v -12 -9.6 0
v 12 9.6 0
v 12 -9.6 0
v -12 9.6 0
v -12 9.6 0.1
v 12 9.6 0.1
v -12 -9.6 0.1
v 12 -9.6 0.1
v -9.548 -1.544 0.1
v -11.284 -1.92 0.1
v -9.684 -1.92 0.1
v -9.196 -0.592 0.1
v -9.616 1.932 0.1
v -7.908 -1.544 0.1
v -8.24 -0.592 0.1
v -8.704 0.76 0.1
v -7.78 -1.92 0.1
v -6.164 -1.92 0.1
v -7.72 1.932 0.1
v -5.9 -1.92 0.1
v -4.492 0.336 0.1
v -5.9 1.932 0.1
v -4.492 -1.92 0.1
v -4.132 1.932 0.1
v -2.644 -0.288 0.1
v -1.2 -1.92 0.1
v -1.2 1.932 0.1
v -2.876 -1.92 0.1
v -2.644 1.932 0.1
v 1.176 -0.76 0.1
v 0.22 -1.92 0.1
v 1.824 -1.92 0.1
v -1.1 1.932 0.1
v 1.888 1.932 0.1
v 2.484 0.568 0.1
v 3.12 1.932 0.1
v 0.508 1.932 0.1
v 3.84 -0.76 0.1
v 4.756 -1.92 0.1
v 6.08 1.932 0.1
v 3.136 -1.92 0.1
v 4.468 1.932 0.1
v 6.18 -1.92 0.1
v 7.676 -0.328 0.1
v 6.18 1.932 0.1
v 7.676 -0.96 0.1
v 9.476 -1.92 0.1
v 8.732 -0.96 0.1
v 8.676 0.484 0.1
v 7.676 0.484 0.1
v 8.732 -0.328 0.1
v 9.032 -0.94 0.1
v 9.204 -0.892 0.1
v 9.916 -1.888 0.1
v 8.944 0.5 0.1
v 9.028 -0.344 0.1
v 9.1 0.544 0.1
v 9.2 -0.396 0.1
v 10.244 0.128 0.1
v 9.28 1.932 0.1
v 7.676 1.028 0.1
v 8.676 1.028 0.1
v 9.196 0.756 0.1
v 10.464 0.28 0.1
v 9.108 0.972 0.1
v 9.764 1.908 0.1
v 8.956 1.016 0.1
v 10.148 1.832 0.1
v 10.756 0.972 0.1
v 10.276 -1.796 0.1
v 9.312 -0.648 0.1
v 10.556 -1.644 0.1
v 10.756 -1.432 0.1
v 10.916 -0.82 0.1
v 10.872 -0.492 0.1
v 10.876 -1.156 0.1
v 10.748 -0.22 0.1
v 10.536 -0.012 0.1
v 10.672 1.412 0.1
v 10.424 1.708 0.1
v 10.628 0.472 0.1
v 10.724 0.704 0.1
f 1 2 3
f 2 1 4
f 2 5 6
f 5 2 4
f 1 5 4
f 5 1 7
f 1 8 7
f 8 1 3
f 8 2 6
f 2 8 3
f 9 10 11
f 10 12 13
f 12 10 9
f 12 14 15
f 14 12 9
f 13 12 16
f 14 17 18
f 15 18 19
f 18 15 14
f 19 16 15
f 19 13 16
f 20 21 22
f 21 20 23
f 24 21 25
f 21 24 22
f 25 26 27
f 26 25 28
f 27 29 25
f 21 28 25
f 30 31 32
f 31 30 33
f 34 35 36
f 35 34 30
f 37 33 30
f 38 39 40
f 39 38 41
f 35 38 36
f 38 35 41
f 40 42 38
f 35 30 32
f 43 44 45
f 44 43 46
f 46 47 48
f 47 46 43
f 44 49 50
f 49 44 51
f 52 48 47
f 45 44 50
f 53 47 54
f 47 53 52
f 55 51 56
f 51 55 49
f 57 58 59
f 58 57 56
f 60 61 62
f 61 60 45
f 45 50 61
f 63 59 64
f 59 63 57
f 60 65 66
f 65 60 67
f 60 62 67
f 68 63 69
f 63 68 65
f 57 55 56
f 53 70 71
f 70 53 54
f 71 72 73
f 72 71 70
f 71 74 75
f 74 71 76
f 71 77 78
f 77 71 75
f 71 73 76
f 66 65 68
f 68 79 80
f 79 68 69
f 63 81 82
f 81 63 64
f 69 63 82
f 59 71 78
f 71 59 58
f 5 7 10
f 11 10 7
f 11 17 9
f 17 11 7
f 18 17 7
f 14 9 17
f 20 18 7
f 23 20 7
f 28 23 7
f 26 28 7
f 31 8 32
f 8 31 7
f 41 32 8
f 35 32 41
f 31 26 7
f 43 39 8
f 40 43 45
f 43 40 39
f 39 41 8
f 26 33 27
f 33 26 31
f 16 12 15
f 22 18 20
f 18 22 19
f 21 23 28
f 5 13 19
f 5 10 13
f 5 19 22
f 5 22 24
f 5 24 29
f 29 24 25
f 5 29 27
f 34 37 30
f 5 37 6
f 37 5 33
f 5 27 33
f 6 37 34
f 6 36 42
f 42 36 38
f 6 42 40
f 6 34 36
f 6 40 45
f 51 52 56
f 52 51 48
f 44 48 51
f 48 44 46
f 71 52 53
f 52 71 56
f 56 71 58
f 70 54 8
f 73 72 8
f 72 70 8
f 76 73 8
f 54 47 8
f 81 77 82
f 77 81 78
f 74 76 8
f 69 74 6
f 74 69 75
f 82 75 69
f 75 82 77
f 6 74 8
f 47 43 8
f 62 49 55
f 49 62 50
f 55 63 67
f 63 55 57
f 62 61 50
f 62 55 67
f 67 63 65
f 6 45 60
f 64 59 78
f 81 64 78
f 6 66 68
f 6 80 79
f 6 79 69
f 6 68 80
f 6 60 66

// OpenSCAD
// file: ../p/box5-12.scad
use <../lib.scad>
function ldraw_lib__box5_12() = [
// 0 Box with 5 Faces without Any Edges
// 0 Name: box5-12.dat
// 0 Author: Chris Dee [cwdee]
// 0 !LDRAW_ORG Primitive UPDATE 2009-02
// 0 !LICENSE Licensed under CC BY 4.0 : see CAreadme.txt
// 
// 0 BFC CERTIFY CCW
  [0,"BFC","CERTIFY"],
  [0,"BFC","CCW"],
// 
// 0 !HISTORY 2009-09-03 [PTadmin] Official Update 2009-02
// 
// 
// 4 16 1 1 1 1 1 -1 -1 1 -1 -1 1 1
  [4,16,1,1,1,1,1,-1,-1,1,-1,-1,1,1],
// 4 16 -1 0 1 1 0 1 1 1 1 -1 1 1
  [4,16,-1,0,1,1,0,1,1,1,1,-1,1,1],
// 4 16 -1 0 -1 -1 0 1 -1 1 1 -1 1 -1
  [4,16,-1,0,-1,-1,0,1,-1,1,1,-1,1,-1],
// 4 16 1 0 -1 -1 0 -1 -1 1 -1 1 1 -1
  [4,16,1,0,-1,-1,0,-1,-1,1,-1,1,1,-1],
// 4 16 1 0 1 1 0 -1 1 1 -1 1 1 1
  [4,16,1,0,1,1,0,-1,1,1,-1,1,1,1],
// 0
];
module ldraw_lib__box5_12(step=0, col=false, unit=2/5, alt=false, line=0.2, solid=!$preview)
    makepoly(ldraw_lib__box5_12(), step=step, col=col, unit=unit, alt=alt, line=line, solid=solid);
ldraw_lib__box5_12(line=0.2);
// main file
use <../lib.scad>
use <../p/box5-12.scad>
function ldraw_lib__194535b() = [
// 0 Sticker  2.4 x  3 with Black "ANWB" on Yellow Background
// 0 Name: 194535b.dat
// 0 Author: Takeshi Takahashi [RainbowDolphin]
// 0 !LDRAW_ORG Part UPDATE 2022-06
// 0 !LICENSE Licensed under CC BY 4.0 : see CAreadme.txt
// 
// 0 BFC CERTIFY CCW
  [0,"BFC","CERTIFY"],
  [0,"BFC","CCW"],
// 
// 0 !KEYWORDS Bricklink 1590.2stk01, Brickowl 599539, Flag, Netherlands
// 0 !KEYWORDS Rebrickable 194535, Road service, Set 1590-2
// 
// 0 !HISTORY 2022-12-20 [PTadmin] Official Update 2022-06
// 
// 
// 1 16 0 -0.25 0 30 0 0 0 0.25 0 0 0 24 box5-12.dat
  [1,16,0,-0.25,0,30,0,0,0,0.25,0,0,0,24, ldraw_lib__box5_12()],
// 3 0 -23.87 -0.25 -3.86 -28.21 -0.25 -4.8 -24.21 -0.25 -4.8
  [3,0,-23.87,-0.25,-3.86,-28.21,-0.25,-4.8,-24.21,-0.25,-4.8],
// 4 0 -22.99 -0.25 -1.48 -24.04 -0.25 4.83 -28.21 -0.25 -4.8 -23.87 -0.25 -3.86
  [4,0,-22.99,-0.25,-1.48,-24.04,-0.25,4.83,-28.21,-0.25,-4.8,-23.87,-0.25,-3.86],
// 4 0 -22.99 -0.25 -1.48 -23.87 -0.25 -3.86 -19.77 -0.25 -3.86 -20.6 -0.25 -1.48
  [4,0,-22.99,-0.25,-1.48,-23.87,-0.25,-3.86,-19.77,-0.25,-3.86,-20.6,-0.25,-1.48],
// 3 0 -24.04 -0.25 4.83 -22.99 -0.25 -1.48 -21.76 -0.25 1.9
  [3,0,-24.04,-0.25,4.83,-22.99,-0.25,-1.48,-21.76,-0.25,1.9],
// 3 0 -19.77 -0.25 -3.86 -19.45 -0.25 -4.8 -15.41 -0.25 -4.8
  [3,0,-19.77,-0.25,-3.86,-19.45,-0.25,-4.8,-15.41,-0.25,-4.8],
// 4 0 -20.6 -0.25 -1.48 -19.77 -0.25 -3.86 -15.41 -0.25 -4.8 -19.3 -0.25 4.83
  [4,0,-20.6,-0.25,-1.48,-19.77,-0.25,-3.86,-15.41,-0.25,-4.8,-19.3,-0.25,4.83],
// 3 0 -19.3 -0.25 4.83 -21.76 -0.25 1.9 -20.6 -0.25 -1.48
  [3,0,-19.3,-0.25,4.83,-21.76,-0.25,1.9,-20.6,-0.25,-1.48],
// 3 0 -19.3 -0.25 4.83 -24.04 -0.25 4.83 -21.76 -0.25 1.9
  [3,0,-19.3,-0.25,4.83,-24.04,-0.25,4.83,-21.76,-0.25,1.9],
// 4 0 -14.75 -0.25 -4.8 -11.23 -0.25 -4.8 -11.23 -0.25 0.84 -14.75 -0.25 4.83
  [4,0,-14.75,-0.25,-4.8,-11.23,-0.25,-4.8,-11.23,-0.25,0.84,-14.75,-0.25,4.83],
// 4 0 -10.33 -0.25 4.83 -14.75 -0.25 4.83 -11.23 -0.25 0.84 -6.61 -0.25 -0.72
  [4,0,-10.33,-0.25,4.83,-14.75,-0.25,4.83,-11.23,-0.25,0.84,-6.61,-0.25,-0.72],
// 4 0 -6.61 -0.25 -0.72 -7.19 -0.25 -4.8 -3 -0.25 -4.8 -3 -0.25 4.83
  [4,0,-6.61,-0.25,-0.72,-7.19,-0.25,-4.8,-3,-0.25,-4.8,-3,-0.25,4.83],
// 3 0 -3 -0.25 4.83 -6.61 -0.25 4.83 -6.61 -0.25 -0.72
  [3,0,-3,-0.25,4.83,-6.61,-0.25,4.83,-6.61,-0.25,-0.72],
// 3 0 -11.23 -0.25 0.84 -7.19 -0.25 -4.8 -6.61 -0.25 -0.72
  [3,0,-11.23,-0.25,0.84,-7.19,-0.25,-4.8,-6.61,-0.25,-0.72],
// 4 0 0.55 -0.25 -4.8 4.56 -0.25 -4.8 2.94 -0.25 -1.9 -2.75 -0.25 4.83
  [4,0,0.55,-0.25,-4.8,4.56,-0.25,-4.8,2.94,-0.25,-1.9,-2.75,-0.25,4.83],
// 4 0 4.72 -0.25 4.83 2.94 -0.25 -1.9 6.21 -0.25 1.42 7.8 -0.25 4.83
  [4,0,4.72,-0.25,4.83,2.94,-0.25,-1.9,6.21,-0.25,1.42,7.8,-0.25,4.83],
// 3 0 1.27 -0.25 4.83 -2.75 -0.25 4.83 2.94 -0.25 -1.9
  [3,0,1.27,-0.25,4.83,-2.75,-0.25,4.83,2.94,-0.25,-1.9],
// 4 0 9.6 -0.25 -1.9 7.84 -0.25 -4.8 11.89 -0.25 -4.8 15.2 -0.25 4.83
  [4,0,9.6,-0.25,-1.9,7.84,-0.25,-4.8,11.89,-0.25,-4.8,15.2,-0.25,4.83],
// 4 0 6.21 -0.25 1.42 7.84 -0.25 -4.8 9.6 -0.25 -1.9 7.8 -0.25 4.83
  [4,0,6.21,-0.25,1.42,7.84,-0.25,-4.8,9.6,-0.25,-1.9,7.8,-0.25,4.83],
// 3 0 15.2 -0.25 4.83 11.17 -0.25 4.83 9.6 -0.25 -1.9
  [3,0,15.2,-0.25,4.83,11.17,-0.25,4.83,9.6,-0.25,-1.9],
// 3 0 6.21 -0.25 1.42 2.94 -0.25 -1.9 4.56 -0.25 -4.8
  [3,0,6.21,-0.25,1.42,2.94,-0.25,-1.9,4.56,-0.25,-4.8],
// 4 0 15.45 -0.25 -4.8 19.19 -0.25 -2.4 19.19 -0.25 -0.82 15.45 -0.25 4.83
  [4,0,15.45,-0.25,-4.8,19.19,-0.25,-2.4,19.19,-0.25,-0.82,15.45,-0.25,4.83],
// 4 0 23.69 -0.25 -4.8 21.83 -0.25 -2.4 19.19 -0.25 -2.4 15.45 -0.25 -4.8
  [4,0,23.69,-0.25,-4.8,21.83,-0.25,-2.4,19.19,-0.25,-2.4,15.45,-0.25,-4.8],
// 4 0 21.69 -0.25 1.21 19.19 -0.25 1.21 19.19 -0.25 -0.82 21.83 -0.25 -0.82
  [4,0,21.69,-0.25,1.21,19.19,-0.25,1.21,19.19,-0.25,-0.82,21.83,-0.25,-0.82],
// 3 0 22.58 -0.25 -2.35 21.83 -0.25 -2.4 23.69 -0.25 -4.8
  [3,0,22.58,-0.25,-2.35,21.83,-0.25,-2.4,23.69,-0.25,-4.8],
// 3 0 15.45 -0.25 4.83 19.19 -0.25 -0.82 19.19 -0.25 1.21
  [3,0,15.45,-0.25,4.83,19.19,-0.25,-0.82,19.19,-0.25,1.21],
// 4 0 23.01 -0.25 -2.23 22.58 -0.25 -2.35 23.69 -0.25 -4.8 24.79 -0.25 -4.72
  [4,0,23.01,-0.25,-2.23,22.58,-0.25,-2.35,23.69,-0.25,-4.8,24.79,-0.25,-4.72],
// 4 0 21.83 -0.25 -0.82 22.57 -0.25 -0.86 22.36 -0.25 1.25 21.69 -0.25 1.21
  [4,0,21.83,-0.25,-0.82,22.57,-0.25,-0.86,22.36,-0.25,1.25,21.69,-0.25,1.21],
// 4 0 23 -0.25 -0.99 25.61 -0.25 0.32 22.75 -0.25 1.36 22.57 -0.25 -0.86
  [4,0,23,-0.25,-0.99,25.61,-0.25,0.32,22.75,-0.25,1.36,22.57,-0.25,-0.86],
// 4 0 23.2 -0.25 4.83 15.45 -0.25 4.83 19.19 -0.25 2.57 21.69 -0.25 2.57
  [4,0,23.2,-0.25,4.83,15.45,-0.25,4.83,19.19,-0.25,2.57,21.69,-0.25,2.57],
// 3 0 15.45 -0.25 4.83 19.19 -0.25 1.21 19.19 -0.25 2.57
  [3,0,15.45,-0.25,4.83,19.19,-0.25,1.21,19.19,-0.25,2.57],
// 4 0 22.99 -0.25 1.89 22.75 -0.25 1.36 25.61 -0.25 0.32 26.16 -0.25 0.7
  [4,0,22.99,-0.25,1.89,22.75,-0.25,1.36,25.61,-0.25,0.32,26.16,-0.25,0.7],
// 4 0 23.2 -0.25 4.83 22.39 -0.25 2.54 22.77 -0.25 2.43 24.41 -0.25 4.77
  [4,0,23.2,-0.25,4.83,22.39,-0.25,2.54,22.77,-0.25,2.43,24.41,-0.25,4.77],
// 3 0 23.2 -0.25 4.83 21.69 -0.25 2.57 22.39 -0.25 2.54
  [3,0,23.2,-0.25,4.83,21.69,-0.25,2.57,22.39,-0.25,2.54],
// 4 0 25.37 -0.25 4.58 22.77 -0.25 2.43 22.99 -0.25 1.89 26.89 -0.25 2.43
  [4,0,25.37,-0.25,4.58,22.77,-0.25,2.43,22.99,-0.25,1.89,26.89,-0.25,2.43],
// 3 0 22.75 -0.25 1.36 22.36 -0.25 1.25 22.57 -0.25 -0.86
  [3,0,22.75,-0.25,1.36,22.36,-0.25,1.25,22.57,-0.25,-0.86],
// 4 0 23.01 -0.25 -2.23 24.79 -0.25 -4.72 25.69 -0.25 -4.49 23.28 -0.25 -1.62
  [4,0,23.01,-0.25,-2.23,24.79,-0.25,-4.72,25.69,-0.25,-4.49,23.28,-0.25,-1.62],
// 4 0 23.28 -0.25 -1.62 25.69 -0.25 -4.49 26.39 -0.25 -4.11 26.89 -0.25 -3.58
  [4,0,23.28,-0.25,-1.62,25.69,-0.25,-4.49,26.39,-0.25,-4.11,26.89,-0.25,-3.58],
// 4 0 23.28 -0.25 -1.62 27.19 -0.25 -2.89 27.29 -0.25 -2.05 27.18 -0.25 -1.23
  [4,0,23.28,-0.25,-1.62,27.19,-0.25,-2.89,27.29,-0.25,-2.05,27.18,-0.25,-1.23],
// 4 0 23.28 -0.25 -1.62 27.18 -0.25 -1.23 26.87 -0.25 -0.55 26.34 -0.25 -0.03
  [4,0,23.28,-0.25,-1.62,27.18,-0.25,-1.23,26.87,-0.25,-0.55,26.34,-0.25,-0.03],
// 3 0 23.28 -0.25 -1.62 26.89 -0.25 -3.58 27.19 -0.25 -2.89
  [3,0,23.28,-0.25,-1.62,26.89,-0.25,-3.58,27.19,-0.25,-2.89],
// 3 0 24.41 -0.25 4.77 22.77 -0.25 2.43 25.37 -0.25 4.58
  [3,0,24.41,-0.25,4.77,22.77,-0.25,2.43,25.37,-0.25,4.58],
// 4 0 26.68 -0.25 3.53 26.06 -0.25 4.27 25.37 -0.25 4.58 26.89 -0.25 2.43
  [4,0,26.68,-0.25,3.53,26.06,-0.25,4.27,25.37,-0.25,4.58,26.89,-0.25,2.43],
// 4 0 22.99 -0.25 1.89 26.16 -0.25 0.7 26.57 -0.25 1.18 26.81 -0.25 1.76
  [4,0,22.99,-0.25,1.89,26.16,-0.25,0.7,26.57,-0.25,1.18,26.81,-0.25,1.76],
// 3 0 26.89 -0.25 2.43 22.99 -0.25 1.89 26.81 -0.25 1.76
  [3,0,26.89,-0.25,2.43,22.99,-0.25,1.89,26.81,-0.25,1.76],
// 4 0 23.28 -0.25 -1.62 26.34 -0.25 -0.03 25.61 -0.25 0.32 23 -0.25 -0.99
  [4,0,23.28,-0.25,-1.62,26.34,-0.25,-0.03,25.61,-0.25,0.32,23,-0.25,-0.99],
// 3 14 -30 -0.25 24 -30 -0.25 -24 -28.21 -0.25 -4.8
  [3,14,-30,-0.25,24,-30,-0.25,-24,-28.21,-0.25,-4.8],
// 3 14 -24.21 -0.25 -4.8 -28.21 -0.25 -4.8 -30 -0.25 -24
  [3,14,-24.21,-0.25,-4.8,-28.21,-0.25,-4.8,-30,-0.25,-24],
// 4 14 -19.45 -0.25 -4.8 -23.87 -0.25 -3.86 -24.21 -0.25 -4.8 -30 -0.25 -24
  [4,14,-19.45,-0.25,-4.8,-23.87,-0.25,-3.86,-24.21,-0.25,-4.8,-30,-0.25,-24],
// 3 14 -15.41 -0.25 -4.8 -19.45 -0.25 -4.8 -30 -0.25 -24
  [3,14,-15.41,-0.25,-4.8,-19.45,-0.25,-4.8,-30,-0.25,-24],
// 3 14 -19.77 -0.25 -3.86 -23.87 -0.25 -3.86 -19.45 -0.25 -4.8
  [3,14,-19.77,-0.25,-3.86,-23.87,-0.25,-3.86,-19.45,-0.25,-4.8],
// 3 14 -14.75 -0.25 -4.8 -15.41 -0.25 -4.8 -30 -0.25 -24
  [3,14,-14.75,-0.25,-4.8,-15.41,-0.25,-4.8,-30,-0.25,-24],
// 3 14 -11.23 -0.25 -4.8 -14.75 -0.25 -4.8 -30 -0.25 -24
  [3,14,-11.23,-0.25,-4.8,-14.75,-0.25,-4.8,-30,-0.25,-24],
// 3 14 -7.19 -0.25 -4.8 -11.23 -0.25 -4.8 -30 -0.25 -24
  [3,14,-7.19,-0.25,-4.8,-11.23,-0.25,-4.8,-30,-0.25,-24],
// 3 14 -3 -0.25 -4.8 -7.19 -0.25 -4.8 -30 -0.25 -24
  [3,14,-3,-0.25,-4.8,-7.19,-0.25,-4.8,-30,-0.25,-24],
// 4 14 30 -0.25 -24 4.56 -0.25 -4.8 0.55 -0.25 -4.8 -30 -0.25 -24
  [4,14,30,-0.25,-24,4.56,-0.25,-4.8,0.55,-0.25,-4.8,-30,-0.25,-24],
// 3 14 7.84 -0.25 -4.8 4.56 -0.25 -4.8 30 -0.25 -24
  [3,14,7.84,-0.25,-4.8,4.56,-0.25,-4.8,30,-0.25,-24],
// 3 14 6.21 -0.25 1.42 4.56 -0.25 -4.8 7.84 -0.25 -4.8
  [3,14,6.21,-0.25,1.42,4.56,-0.25,-4.8,7.84,-0.25,-4.8],
// 3 14 0.55 -0.25 -4.8 -3 -0.25 -4.8 -30 -0.25 -24
  [3,14,0.55,-0.25,-4.8,-3,-0.25,-4.8,-30,-0.25,-24],
// 3 14 15.45 -0.25 -4.8 11.89 -0.25 -4.8 30 -0.25 -24
  [3,14,15.45,-0.25,-4.8,11.89,-0.25,-4.8,30,-0.25,-24],
// 4 14 15.2 -0.25 4.83 11.89 -0.25 -4.8 15.45 -0.25 -4.8 15.45 -0.25 4.83
  [4,14,15.2,-0.25,4.83,11.89,-0.25,-4.8,15.45,-0.25,-4.8,15.45,-0.25,4.83],
// 3 14 11.89 -0.25 -4.8 7.84 -0.25 -4.8 30 -0.25 -24
  [3,14,11.89,-0.25,-4.8,7.84,-0.25,-4.8,30,-0.25,-24],
// 4 14 -3 -0.25 -4.8 0.55 -0.25 -4.8 -2.75 -0.25 4.83 -3 -0.25 4.83
  [4,14,-3,-0.25,-4.8,0.55,-0.25,-4.8,-2.75,-0.25,4.83,-3,-0.25,4.83],
// 3 14 -21.76 -0.25 1.9 -22.99 -0.25 -1.48 -20.6 -0.25 -1.48
  [3,14,-21.76,-0.25,1.9,-22.99,-0.25,-1.48,-20.6,-0.25,-1.48],
// 4 14 -15.41 -0.25 -4.8 -14.75 -0.25 -4.8 -14.75 -0.25 4.83 -19.3 -0.25 4.83
  [4,14,-15.41,-0.25,-4.8,-14.75,-0.25,-4.8,-14.75,-0.25,4.83,-19.3,-0.25,4.83],
// 3 14 -11.23 -0.25 0.84 -11.23 -0.25 -4.8 -7.19 -0.25 -4.8
  [3,14,-11.23,-0.25,0.84,-11.23,-0.25,-4.8,-7.19,-0.25,-4.8],
// 3 14 -30 -0.25 24 -24.04 -0.25 4.83 -19.3 -0.25 4.83
  [3,14,-30,-0.25,24,-24.04,-0.25,4.83,-19.3,-0.25,4.83],
// 3 14 -30 -0.25 24 -28.21 -0.25 -4.8 -24.04 -0.25 4.83
  [3,14,-30,-0.25,24,-28.21,-0.25,-4.8,-24.04,-0.25,4.83],
// 3 14 -30 -0.25 24 -19.3 -0.25 4.83 -14.75 -0.25 4.83
  [3,14,-30,-0.25,24,-19.3,-0.25,4.83,-14.75,-0.25,4.83],
// 3 14 -30 -0.25 24 -14.75 -0.25 4.83 -10.33 -0.25 4.83
  [3,14,-30,-0.25,24,-14.75,-0.25,4.83,-10.33,-0.25,4.83],
// 3 14 -30 -0.25 24 -10.33 -0.25 4.83 -6.61 -0.25 4.83
  [3,14,-30,-0.25,24,-10.33,-0.25,4.83,-6.61,-0.25,4.83],
// 3 14 -6.61 -0.25 4.83 -10.33 -0.25 4.83 -6.61 -0.25 -0.72
  [3,14,-6.61,-0.25,4.83,-10.33,-0.25,4.83,-6.61,-0.25,-0.72],
// 3 14 -30 -0.25 24 -6.61 -0.25 4.83 -3 -0.25 4.83
  [3,14,-30,-0.25,24,-6.61,-0.25,4.83,-3,-0.25,4.83],
// 3 14 4.72 -0.25 4.83 1.27 -0.25 4.83 2.94 -0.25 -1.9
  [3,14,4.72,-0.25,4.83,1.27,-0.25,4.83,2.94,-0.25,-1.9],
// 4 14 -30 -0.25 24 -2.75 -0.25 4.83 1.27 -0.25 4.83 30 -0.25 24
  [4,14,-30,-0.25,24,-2.75,-0.25,4.83,1.27,-0.25,4.83,30,-0.25,24],
// 3 14 -30 -0.25 24 -3 -0.25 4.83 -2.75 -0.25 4.83
  [3,14,-30,-0.25,24,-3,-0.25,4.83,-2.75,-0.25,4.83],
// 3 14 30 -0.25 24 1.27 -0.25 4.83 4.72 -0.25 4.83
  [3,14,30,-0.25,24,1.27,-0.25,4.83,4.72,-0.25,4.83],
// 3 14 30 -0.25 24 7.8 -0.25 4.83 11.17 -0.25 4.83
  [3,14,30,-0.25,24,7.8,-0.25,4.83,11.17,-0.25,4.83],
// 3 14 11.17 -0.25 4.83 7.8 -0.25 4.83 9.6 -0.25 -1.9
  [3,14,11.17,-0.25,4.83,7.8,-0.25,4.83,9.6,-0.25,-1.9],
// 3 14 30 -0.25 24 11.17 -0.25 4.83 15.2 -0.25 4.83
  [3,14,30,-0.25,24,11.17,-0.25,4.83,15.2,-0.25,4.83],
// 3 14 30 -0.25 24 4.72 -0.25 4.83 7.8 -0.25 4.83
  [3,14,30,-0.25,24,4.72,-0.25,4.83,7.8,-0.25,4.83],
// 3 14 30 -0.25 24 15.2 -0.25 4.83 15.45 -0.25 4.83
  [3,14,30,-0.25,24,15.2,-0.25,4.83,15.45,-0.25,4.83],
// 4 14 21.83 -0.25 -2.4 22.58 -0.25 -2.35 22.57 -0.25 -0.86 21.83 -0.25 -0.82
  [4,14,21.83,-0.25,-2.4,22.58,-0.25,-2.35,22.57,-0.25,-0.86,21.83,-0.25,-0.82],
// 4 14 19.19 -0.25 -0.82 19.19 -0.25 -2.4 21.83 -0.25 -2.4 21.83 -0.25 -0.82
  [4,14,19.19,-0.25,-0.82,19.19,-0.25,-2.4,21.83,-0.25,-2.4,21.83,-0.25,-0.82],
// 4 14 22.58 -0.25 -2.35 23.01 -0.25 -2.23 23.28 -0.25 -1.62 22.57 -0.25 -0.86
  [4,14,22.58,-0.25,-2.35,23.01,-0.25,-2.23,23.28,-0.25,-1.62,22.57,-0.25,-0.86],
// 3 14 22.57 -0.25 -0.86 23.28 -0.25 -1.62 23 -0.25 -0.99
  [3,14,22.57,-0.25,-0.86,23.28,-0.25,-1.62,23,-0.25,-0.99],
// 3 14 25.69 -0.25 -4.49 24.79 -0.25 -4.72 30 -0.25 -24
  [3,14,25.69,-0.25,-4.49,24.79,-0.25,-4.72,30,-0.25,-24],
// 3 14 26.89 -0.25 -3.58 26.39 -0.25 -4.11 30 -0.25 -24
  [3,14,26.89,-0.25,-3.58,26.39,-0.25,-4.11,30,-0.25,-24],
// 3 14 26.39 -0.25 -4.11 25.69 -0.25 -4.49 30 -0.25 -24
  [3,14,26.39,-0.25,-4.11,25.69,-0.25,-4.49,30,-0.25,-24],
// 3 14 27.19 -0.25 -2.89 26.89 -0.25 -3.58 30 -0.25 -24
  [3,14,27.19,-0.25,-2.89,26.89,-0.25,-3.58,30,-0.25,-24],
// 3 14 24.79 -0.25 -4.72 23.69 -0.25 -4.8 30 -0.25 -24
  [3,14,24.79,-0.25,-4.72,23.69,-0.25,-4.8,30,-0.25,-24],
// 4 14 26.57 -0.25 1.18 26.34 -0.25 -0.03 26.87 -0.25 -0.55 26.81 -0.25 1.76
  [4,14,26.57,-0.25,1.18,26.34,-0.25,-0.03,26.87,-0.25,-0.55,26.81,-0.25,1.76],
// 3 14 27.29 -0.25 -2.05 27.19 -0.25 -2.89 30 -0.25 -24
  [3,14,27.29,-0.25,-2.05,27.19,-0.25,-2.89,30,-0.25,-24],
// 4 14 27.18 -0.25 -1.23 27.29 -0.25 -2.05 30 -0.25 24 26.89 -0.25 2.43
  [4,14,27.18,-0.25,-1.23,27.29,-0.25,-2.05,30,-0.25,24,26.89,-0.25,2.43],
// 4 14 26.81 -0.25 1.76 26.87 -0.25 -0.55 27.18 -0.25 -1.23 26.89 -0.25 2.43
  [4,14,26.81,-0.25,1.76,26.87,-0.25,-0.55,27.18,-0.25,-1.23,26.89,-0.25,2.43],
// 3 14 30 -0.25 24 27.29 -0.25 -2.05 30 -0.25 -24
  [3,14,30,-0.25,24,27.29,-0.25,-2.05,30,-0.25,-24],
// 3 14 23.69 -0.25 -4.8 15.45 -0.25 -4.8 30 -0.25 -24
  [3,14,23.69,-0.25,-4.8,15.45,-0.25,-4.8,30,-0.25,-24],
// 4 14 21.69 -0.25 2.57 19.19 -0.25 1.21 21.69 -0.25 1.21 22.36 -0.25 1.25
  [4,14,21.69,-0.25,2.57,19.19,-0.25,1.21,21.69,-0.25,1.21,22.36,-0.25,1.25],
// 4 14 22.36 -0.25 1.25 22.75 -0.25 1.36 22.99 -0.25 1.89 22.39 -0.25 2.54
  [4,14,22.36,-0.25,1.25,22.75,-0.25,1.36,22.99,-0.25,1.89,22.39,-0.25,2.54],
// 3 14 21.69 -0.25 2.57 19.19 -0.25 2.57 19.19 -0.25 1.21
  [3,14,21.69,-0.25,2.57,19.19,-0.25,2.57,19.19,-0.25,1.21],
// 3 14 21.69 -0.25 2.57 22.36 -0.25 1.25 22.39 -0.25 2.54
  [3,14,21.69,-0.25,2.57,22.36,-0.25,1.25,22.39,-0.25,2.54],
// 3 14 22.39 -0.25 2.54 22.99 -0.25 1.89 22.77 -0.25 2.43
  [3,14,22.39,-0.25,2.54,22.99,-0.25,1.89,22.77,-0.25,2.43],
// 3 14 30 -0.25 24 15.45 -0.25 4.83 23.2 -0.25 4.83
  [3,14,30,-0.25,24,15.45,-0.25,4.83,23.2,-0.25,4.83],
// 3 14 26.16 -0.25 0.7 25.61 -0.25 0.32 26.34 -0.25 -0.03
  [3,14,26.16,-0.25,0.7,25.61,-0.25,0.32,26.34,-0.25,-0.03],
// 3 14 26.57 -0.25 1.18 26.16 -0.25 0.7 26.34 -0.25 -0.03
  [3,14,26.57,-0.25,1.18,26.16,-0.25,0.7,26.34,-0.25,-0.03],
// 3 14 30 -0.25 24 24.41 -0.25 4.77 25.37 -0.25 4.58
  [3,14,30,-0.25,24,24.41,-0.25,4.77,25.37,-0.25,4.58],
// 3 14 30 -0.25 24 26.06 -0.25 4.27 26.68 -0.25 3.53
  [3,14,30,-0.25,24,26.06,-0.25,4.27,26.68,-0.25,3.53],
// 3 14 30 -0.25 24 26.68 -0.25 3.53 26.89 -0.25 2.43
  [3,14,30,-0.25,24,26.68,-0.25,3.53,26.89,-0.25,2.43],
// 3 14 30 -0.25 24 25.37 -0.25 4.58 26.06 -0.25 4.27
  [3,14,30,-0.25,24,25.37,-0.25,4.58,26.06,-0.25,4.27],
// 3 14 30 -0.25 24 23.2 -0.25 4.83 24.41 -0.25 4.77
  [3,14,30,-0.25,24,23.2,-0.25,4.83,24.41,-0.25,4.77],
];
module ldraw_lib__194535b(step=0, col=false, unit=2/5, alt=false, line=0.2, solid=!$preview)
    makepoly(ldraw_lib__194535b(), step=step, col=col, unit=unit, alt=alt, line=line, solid=solid);
ldraw_lib__194535b(line=0.2);
